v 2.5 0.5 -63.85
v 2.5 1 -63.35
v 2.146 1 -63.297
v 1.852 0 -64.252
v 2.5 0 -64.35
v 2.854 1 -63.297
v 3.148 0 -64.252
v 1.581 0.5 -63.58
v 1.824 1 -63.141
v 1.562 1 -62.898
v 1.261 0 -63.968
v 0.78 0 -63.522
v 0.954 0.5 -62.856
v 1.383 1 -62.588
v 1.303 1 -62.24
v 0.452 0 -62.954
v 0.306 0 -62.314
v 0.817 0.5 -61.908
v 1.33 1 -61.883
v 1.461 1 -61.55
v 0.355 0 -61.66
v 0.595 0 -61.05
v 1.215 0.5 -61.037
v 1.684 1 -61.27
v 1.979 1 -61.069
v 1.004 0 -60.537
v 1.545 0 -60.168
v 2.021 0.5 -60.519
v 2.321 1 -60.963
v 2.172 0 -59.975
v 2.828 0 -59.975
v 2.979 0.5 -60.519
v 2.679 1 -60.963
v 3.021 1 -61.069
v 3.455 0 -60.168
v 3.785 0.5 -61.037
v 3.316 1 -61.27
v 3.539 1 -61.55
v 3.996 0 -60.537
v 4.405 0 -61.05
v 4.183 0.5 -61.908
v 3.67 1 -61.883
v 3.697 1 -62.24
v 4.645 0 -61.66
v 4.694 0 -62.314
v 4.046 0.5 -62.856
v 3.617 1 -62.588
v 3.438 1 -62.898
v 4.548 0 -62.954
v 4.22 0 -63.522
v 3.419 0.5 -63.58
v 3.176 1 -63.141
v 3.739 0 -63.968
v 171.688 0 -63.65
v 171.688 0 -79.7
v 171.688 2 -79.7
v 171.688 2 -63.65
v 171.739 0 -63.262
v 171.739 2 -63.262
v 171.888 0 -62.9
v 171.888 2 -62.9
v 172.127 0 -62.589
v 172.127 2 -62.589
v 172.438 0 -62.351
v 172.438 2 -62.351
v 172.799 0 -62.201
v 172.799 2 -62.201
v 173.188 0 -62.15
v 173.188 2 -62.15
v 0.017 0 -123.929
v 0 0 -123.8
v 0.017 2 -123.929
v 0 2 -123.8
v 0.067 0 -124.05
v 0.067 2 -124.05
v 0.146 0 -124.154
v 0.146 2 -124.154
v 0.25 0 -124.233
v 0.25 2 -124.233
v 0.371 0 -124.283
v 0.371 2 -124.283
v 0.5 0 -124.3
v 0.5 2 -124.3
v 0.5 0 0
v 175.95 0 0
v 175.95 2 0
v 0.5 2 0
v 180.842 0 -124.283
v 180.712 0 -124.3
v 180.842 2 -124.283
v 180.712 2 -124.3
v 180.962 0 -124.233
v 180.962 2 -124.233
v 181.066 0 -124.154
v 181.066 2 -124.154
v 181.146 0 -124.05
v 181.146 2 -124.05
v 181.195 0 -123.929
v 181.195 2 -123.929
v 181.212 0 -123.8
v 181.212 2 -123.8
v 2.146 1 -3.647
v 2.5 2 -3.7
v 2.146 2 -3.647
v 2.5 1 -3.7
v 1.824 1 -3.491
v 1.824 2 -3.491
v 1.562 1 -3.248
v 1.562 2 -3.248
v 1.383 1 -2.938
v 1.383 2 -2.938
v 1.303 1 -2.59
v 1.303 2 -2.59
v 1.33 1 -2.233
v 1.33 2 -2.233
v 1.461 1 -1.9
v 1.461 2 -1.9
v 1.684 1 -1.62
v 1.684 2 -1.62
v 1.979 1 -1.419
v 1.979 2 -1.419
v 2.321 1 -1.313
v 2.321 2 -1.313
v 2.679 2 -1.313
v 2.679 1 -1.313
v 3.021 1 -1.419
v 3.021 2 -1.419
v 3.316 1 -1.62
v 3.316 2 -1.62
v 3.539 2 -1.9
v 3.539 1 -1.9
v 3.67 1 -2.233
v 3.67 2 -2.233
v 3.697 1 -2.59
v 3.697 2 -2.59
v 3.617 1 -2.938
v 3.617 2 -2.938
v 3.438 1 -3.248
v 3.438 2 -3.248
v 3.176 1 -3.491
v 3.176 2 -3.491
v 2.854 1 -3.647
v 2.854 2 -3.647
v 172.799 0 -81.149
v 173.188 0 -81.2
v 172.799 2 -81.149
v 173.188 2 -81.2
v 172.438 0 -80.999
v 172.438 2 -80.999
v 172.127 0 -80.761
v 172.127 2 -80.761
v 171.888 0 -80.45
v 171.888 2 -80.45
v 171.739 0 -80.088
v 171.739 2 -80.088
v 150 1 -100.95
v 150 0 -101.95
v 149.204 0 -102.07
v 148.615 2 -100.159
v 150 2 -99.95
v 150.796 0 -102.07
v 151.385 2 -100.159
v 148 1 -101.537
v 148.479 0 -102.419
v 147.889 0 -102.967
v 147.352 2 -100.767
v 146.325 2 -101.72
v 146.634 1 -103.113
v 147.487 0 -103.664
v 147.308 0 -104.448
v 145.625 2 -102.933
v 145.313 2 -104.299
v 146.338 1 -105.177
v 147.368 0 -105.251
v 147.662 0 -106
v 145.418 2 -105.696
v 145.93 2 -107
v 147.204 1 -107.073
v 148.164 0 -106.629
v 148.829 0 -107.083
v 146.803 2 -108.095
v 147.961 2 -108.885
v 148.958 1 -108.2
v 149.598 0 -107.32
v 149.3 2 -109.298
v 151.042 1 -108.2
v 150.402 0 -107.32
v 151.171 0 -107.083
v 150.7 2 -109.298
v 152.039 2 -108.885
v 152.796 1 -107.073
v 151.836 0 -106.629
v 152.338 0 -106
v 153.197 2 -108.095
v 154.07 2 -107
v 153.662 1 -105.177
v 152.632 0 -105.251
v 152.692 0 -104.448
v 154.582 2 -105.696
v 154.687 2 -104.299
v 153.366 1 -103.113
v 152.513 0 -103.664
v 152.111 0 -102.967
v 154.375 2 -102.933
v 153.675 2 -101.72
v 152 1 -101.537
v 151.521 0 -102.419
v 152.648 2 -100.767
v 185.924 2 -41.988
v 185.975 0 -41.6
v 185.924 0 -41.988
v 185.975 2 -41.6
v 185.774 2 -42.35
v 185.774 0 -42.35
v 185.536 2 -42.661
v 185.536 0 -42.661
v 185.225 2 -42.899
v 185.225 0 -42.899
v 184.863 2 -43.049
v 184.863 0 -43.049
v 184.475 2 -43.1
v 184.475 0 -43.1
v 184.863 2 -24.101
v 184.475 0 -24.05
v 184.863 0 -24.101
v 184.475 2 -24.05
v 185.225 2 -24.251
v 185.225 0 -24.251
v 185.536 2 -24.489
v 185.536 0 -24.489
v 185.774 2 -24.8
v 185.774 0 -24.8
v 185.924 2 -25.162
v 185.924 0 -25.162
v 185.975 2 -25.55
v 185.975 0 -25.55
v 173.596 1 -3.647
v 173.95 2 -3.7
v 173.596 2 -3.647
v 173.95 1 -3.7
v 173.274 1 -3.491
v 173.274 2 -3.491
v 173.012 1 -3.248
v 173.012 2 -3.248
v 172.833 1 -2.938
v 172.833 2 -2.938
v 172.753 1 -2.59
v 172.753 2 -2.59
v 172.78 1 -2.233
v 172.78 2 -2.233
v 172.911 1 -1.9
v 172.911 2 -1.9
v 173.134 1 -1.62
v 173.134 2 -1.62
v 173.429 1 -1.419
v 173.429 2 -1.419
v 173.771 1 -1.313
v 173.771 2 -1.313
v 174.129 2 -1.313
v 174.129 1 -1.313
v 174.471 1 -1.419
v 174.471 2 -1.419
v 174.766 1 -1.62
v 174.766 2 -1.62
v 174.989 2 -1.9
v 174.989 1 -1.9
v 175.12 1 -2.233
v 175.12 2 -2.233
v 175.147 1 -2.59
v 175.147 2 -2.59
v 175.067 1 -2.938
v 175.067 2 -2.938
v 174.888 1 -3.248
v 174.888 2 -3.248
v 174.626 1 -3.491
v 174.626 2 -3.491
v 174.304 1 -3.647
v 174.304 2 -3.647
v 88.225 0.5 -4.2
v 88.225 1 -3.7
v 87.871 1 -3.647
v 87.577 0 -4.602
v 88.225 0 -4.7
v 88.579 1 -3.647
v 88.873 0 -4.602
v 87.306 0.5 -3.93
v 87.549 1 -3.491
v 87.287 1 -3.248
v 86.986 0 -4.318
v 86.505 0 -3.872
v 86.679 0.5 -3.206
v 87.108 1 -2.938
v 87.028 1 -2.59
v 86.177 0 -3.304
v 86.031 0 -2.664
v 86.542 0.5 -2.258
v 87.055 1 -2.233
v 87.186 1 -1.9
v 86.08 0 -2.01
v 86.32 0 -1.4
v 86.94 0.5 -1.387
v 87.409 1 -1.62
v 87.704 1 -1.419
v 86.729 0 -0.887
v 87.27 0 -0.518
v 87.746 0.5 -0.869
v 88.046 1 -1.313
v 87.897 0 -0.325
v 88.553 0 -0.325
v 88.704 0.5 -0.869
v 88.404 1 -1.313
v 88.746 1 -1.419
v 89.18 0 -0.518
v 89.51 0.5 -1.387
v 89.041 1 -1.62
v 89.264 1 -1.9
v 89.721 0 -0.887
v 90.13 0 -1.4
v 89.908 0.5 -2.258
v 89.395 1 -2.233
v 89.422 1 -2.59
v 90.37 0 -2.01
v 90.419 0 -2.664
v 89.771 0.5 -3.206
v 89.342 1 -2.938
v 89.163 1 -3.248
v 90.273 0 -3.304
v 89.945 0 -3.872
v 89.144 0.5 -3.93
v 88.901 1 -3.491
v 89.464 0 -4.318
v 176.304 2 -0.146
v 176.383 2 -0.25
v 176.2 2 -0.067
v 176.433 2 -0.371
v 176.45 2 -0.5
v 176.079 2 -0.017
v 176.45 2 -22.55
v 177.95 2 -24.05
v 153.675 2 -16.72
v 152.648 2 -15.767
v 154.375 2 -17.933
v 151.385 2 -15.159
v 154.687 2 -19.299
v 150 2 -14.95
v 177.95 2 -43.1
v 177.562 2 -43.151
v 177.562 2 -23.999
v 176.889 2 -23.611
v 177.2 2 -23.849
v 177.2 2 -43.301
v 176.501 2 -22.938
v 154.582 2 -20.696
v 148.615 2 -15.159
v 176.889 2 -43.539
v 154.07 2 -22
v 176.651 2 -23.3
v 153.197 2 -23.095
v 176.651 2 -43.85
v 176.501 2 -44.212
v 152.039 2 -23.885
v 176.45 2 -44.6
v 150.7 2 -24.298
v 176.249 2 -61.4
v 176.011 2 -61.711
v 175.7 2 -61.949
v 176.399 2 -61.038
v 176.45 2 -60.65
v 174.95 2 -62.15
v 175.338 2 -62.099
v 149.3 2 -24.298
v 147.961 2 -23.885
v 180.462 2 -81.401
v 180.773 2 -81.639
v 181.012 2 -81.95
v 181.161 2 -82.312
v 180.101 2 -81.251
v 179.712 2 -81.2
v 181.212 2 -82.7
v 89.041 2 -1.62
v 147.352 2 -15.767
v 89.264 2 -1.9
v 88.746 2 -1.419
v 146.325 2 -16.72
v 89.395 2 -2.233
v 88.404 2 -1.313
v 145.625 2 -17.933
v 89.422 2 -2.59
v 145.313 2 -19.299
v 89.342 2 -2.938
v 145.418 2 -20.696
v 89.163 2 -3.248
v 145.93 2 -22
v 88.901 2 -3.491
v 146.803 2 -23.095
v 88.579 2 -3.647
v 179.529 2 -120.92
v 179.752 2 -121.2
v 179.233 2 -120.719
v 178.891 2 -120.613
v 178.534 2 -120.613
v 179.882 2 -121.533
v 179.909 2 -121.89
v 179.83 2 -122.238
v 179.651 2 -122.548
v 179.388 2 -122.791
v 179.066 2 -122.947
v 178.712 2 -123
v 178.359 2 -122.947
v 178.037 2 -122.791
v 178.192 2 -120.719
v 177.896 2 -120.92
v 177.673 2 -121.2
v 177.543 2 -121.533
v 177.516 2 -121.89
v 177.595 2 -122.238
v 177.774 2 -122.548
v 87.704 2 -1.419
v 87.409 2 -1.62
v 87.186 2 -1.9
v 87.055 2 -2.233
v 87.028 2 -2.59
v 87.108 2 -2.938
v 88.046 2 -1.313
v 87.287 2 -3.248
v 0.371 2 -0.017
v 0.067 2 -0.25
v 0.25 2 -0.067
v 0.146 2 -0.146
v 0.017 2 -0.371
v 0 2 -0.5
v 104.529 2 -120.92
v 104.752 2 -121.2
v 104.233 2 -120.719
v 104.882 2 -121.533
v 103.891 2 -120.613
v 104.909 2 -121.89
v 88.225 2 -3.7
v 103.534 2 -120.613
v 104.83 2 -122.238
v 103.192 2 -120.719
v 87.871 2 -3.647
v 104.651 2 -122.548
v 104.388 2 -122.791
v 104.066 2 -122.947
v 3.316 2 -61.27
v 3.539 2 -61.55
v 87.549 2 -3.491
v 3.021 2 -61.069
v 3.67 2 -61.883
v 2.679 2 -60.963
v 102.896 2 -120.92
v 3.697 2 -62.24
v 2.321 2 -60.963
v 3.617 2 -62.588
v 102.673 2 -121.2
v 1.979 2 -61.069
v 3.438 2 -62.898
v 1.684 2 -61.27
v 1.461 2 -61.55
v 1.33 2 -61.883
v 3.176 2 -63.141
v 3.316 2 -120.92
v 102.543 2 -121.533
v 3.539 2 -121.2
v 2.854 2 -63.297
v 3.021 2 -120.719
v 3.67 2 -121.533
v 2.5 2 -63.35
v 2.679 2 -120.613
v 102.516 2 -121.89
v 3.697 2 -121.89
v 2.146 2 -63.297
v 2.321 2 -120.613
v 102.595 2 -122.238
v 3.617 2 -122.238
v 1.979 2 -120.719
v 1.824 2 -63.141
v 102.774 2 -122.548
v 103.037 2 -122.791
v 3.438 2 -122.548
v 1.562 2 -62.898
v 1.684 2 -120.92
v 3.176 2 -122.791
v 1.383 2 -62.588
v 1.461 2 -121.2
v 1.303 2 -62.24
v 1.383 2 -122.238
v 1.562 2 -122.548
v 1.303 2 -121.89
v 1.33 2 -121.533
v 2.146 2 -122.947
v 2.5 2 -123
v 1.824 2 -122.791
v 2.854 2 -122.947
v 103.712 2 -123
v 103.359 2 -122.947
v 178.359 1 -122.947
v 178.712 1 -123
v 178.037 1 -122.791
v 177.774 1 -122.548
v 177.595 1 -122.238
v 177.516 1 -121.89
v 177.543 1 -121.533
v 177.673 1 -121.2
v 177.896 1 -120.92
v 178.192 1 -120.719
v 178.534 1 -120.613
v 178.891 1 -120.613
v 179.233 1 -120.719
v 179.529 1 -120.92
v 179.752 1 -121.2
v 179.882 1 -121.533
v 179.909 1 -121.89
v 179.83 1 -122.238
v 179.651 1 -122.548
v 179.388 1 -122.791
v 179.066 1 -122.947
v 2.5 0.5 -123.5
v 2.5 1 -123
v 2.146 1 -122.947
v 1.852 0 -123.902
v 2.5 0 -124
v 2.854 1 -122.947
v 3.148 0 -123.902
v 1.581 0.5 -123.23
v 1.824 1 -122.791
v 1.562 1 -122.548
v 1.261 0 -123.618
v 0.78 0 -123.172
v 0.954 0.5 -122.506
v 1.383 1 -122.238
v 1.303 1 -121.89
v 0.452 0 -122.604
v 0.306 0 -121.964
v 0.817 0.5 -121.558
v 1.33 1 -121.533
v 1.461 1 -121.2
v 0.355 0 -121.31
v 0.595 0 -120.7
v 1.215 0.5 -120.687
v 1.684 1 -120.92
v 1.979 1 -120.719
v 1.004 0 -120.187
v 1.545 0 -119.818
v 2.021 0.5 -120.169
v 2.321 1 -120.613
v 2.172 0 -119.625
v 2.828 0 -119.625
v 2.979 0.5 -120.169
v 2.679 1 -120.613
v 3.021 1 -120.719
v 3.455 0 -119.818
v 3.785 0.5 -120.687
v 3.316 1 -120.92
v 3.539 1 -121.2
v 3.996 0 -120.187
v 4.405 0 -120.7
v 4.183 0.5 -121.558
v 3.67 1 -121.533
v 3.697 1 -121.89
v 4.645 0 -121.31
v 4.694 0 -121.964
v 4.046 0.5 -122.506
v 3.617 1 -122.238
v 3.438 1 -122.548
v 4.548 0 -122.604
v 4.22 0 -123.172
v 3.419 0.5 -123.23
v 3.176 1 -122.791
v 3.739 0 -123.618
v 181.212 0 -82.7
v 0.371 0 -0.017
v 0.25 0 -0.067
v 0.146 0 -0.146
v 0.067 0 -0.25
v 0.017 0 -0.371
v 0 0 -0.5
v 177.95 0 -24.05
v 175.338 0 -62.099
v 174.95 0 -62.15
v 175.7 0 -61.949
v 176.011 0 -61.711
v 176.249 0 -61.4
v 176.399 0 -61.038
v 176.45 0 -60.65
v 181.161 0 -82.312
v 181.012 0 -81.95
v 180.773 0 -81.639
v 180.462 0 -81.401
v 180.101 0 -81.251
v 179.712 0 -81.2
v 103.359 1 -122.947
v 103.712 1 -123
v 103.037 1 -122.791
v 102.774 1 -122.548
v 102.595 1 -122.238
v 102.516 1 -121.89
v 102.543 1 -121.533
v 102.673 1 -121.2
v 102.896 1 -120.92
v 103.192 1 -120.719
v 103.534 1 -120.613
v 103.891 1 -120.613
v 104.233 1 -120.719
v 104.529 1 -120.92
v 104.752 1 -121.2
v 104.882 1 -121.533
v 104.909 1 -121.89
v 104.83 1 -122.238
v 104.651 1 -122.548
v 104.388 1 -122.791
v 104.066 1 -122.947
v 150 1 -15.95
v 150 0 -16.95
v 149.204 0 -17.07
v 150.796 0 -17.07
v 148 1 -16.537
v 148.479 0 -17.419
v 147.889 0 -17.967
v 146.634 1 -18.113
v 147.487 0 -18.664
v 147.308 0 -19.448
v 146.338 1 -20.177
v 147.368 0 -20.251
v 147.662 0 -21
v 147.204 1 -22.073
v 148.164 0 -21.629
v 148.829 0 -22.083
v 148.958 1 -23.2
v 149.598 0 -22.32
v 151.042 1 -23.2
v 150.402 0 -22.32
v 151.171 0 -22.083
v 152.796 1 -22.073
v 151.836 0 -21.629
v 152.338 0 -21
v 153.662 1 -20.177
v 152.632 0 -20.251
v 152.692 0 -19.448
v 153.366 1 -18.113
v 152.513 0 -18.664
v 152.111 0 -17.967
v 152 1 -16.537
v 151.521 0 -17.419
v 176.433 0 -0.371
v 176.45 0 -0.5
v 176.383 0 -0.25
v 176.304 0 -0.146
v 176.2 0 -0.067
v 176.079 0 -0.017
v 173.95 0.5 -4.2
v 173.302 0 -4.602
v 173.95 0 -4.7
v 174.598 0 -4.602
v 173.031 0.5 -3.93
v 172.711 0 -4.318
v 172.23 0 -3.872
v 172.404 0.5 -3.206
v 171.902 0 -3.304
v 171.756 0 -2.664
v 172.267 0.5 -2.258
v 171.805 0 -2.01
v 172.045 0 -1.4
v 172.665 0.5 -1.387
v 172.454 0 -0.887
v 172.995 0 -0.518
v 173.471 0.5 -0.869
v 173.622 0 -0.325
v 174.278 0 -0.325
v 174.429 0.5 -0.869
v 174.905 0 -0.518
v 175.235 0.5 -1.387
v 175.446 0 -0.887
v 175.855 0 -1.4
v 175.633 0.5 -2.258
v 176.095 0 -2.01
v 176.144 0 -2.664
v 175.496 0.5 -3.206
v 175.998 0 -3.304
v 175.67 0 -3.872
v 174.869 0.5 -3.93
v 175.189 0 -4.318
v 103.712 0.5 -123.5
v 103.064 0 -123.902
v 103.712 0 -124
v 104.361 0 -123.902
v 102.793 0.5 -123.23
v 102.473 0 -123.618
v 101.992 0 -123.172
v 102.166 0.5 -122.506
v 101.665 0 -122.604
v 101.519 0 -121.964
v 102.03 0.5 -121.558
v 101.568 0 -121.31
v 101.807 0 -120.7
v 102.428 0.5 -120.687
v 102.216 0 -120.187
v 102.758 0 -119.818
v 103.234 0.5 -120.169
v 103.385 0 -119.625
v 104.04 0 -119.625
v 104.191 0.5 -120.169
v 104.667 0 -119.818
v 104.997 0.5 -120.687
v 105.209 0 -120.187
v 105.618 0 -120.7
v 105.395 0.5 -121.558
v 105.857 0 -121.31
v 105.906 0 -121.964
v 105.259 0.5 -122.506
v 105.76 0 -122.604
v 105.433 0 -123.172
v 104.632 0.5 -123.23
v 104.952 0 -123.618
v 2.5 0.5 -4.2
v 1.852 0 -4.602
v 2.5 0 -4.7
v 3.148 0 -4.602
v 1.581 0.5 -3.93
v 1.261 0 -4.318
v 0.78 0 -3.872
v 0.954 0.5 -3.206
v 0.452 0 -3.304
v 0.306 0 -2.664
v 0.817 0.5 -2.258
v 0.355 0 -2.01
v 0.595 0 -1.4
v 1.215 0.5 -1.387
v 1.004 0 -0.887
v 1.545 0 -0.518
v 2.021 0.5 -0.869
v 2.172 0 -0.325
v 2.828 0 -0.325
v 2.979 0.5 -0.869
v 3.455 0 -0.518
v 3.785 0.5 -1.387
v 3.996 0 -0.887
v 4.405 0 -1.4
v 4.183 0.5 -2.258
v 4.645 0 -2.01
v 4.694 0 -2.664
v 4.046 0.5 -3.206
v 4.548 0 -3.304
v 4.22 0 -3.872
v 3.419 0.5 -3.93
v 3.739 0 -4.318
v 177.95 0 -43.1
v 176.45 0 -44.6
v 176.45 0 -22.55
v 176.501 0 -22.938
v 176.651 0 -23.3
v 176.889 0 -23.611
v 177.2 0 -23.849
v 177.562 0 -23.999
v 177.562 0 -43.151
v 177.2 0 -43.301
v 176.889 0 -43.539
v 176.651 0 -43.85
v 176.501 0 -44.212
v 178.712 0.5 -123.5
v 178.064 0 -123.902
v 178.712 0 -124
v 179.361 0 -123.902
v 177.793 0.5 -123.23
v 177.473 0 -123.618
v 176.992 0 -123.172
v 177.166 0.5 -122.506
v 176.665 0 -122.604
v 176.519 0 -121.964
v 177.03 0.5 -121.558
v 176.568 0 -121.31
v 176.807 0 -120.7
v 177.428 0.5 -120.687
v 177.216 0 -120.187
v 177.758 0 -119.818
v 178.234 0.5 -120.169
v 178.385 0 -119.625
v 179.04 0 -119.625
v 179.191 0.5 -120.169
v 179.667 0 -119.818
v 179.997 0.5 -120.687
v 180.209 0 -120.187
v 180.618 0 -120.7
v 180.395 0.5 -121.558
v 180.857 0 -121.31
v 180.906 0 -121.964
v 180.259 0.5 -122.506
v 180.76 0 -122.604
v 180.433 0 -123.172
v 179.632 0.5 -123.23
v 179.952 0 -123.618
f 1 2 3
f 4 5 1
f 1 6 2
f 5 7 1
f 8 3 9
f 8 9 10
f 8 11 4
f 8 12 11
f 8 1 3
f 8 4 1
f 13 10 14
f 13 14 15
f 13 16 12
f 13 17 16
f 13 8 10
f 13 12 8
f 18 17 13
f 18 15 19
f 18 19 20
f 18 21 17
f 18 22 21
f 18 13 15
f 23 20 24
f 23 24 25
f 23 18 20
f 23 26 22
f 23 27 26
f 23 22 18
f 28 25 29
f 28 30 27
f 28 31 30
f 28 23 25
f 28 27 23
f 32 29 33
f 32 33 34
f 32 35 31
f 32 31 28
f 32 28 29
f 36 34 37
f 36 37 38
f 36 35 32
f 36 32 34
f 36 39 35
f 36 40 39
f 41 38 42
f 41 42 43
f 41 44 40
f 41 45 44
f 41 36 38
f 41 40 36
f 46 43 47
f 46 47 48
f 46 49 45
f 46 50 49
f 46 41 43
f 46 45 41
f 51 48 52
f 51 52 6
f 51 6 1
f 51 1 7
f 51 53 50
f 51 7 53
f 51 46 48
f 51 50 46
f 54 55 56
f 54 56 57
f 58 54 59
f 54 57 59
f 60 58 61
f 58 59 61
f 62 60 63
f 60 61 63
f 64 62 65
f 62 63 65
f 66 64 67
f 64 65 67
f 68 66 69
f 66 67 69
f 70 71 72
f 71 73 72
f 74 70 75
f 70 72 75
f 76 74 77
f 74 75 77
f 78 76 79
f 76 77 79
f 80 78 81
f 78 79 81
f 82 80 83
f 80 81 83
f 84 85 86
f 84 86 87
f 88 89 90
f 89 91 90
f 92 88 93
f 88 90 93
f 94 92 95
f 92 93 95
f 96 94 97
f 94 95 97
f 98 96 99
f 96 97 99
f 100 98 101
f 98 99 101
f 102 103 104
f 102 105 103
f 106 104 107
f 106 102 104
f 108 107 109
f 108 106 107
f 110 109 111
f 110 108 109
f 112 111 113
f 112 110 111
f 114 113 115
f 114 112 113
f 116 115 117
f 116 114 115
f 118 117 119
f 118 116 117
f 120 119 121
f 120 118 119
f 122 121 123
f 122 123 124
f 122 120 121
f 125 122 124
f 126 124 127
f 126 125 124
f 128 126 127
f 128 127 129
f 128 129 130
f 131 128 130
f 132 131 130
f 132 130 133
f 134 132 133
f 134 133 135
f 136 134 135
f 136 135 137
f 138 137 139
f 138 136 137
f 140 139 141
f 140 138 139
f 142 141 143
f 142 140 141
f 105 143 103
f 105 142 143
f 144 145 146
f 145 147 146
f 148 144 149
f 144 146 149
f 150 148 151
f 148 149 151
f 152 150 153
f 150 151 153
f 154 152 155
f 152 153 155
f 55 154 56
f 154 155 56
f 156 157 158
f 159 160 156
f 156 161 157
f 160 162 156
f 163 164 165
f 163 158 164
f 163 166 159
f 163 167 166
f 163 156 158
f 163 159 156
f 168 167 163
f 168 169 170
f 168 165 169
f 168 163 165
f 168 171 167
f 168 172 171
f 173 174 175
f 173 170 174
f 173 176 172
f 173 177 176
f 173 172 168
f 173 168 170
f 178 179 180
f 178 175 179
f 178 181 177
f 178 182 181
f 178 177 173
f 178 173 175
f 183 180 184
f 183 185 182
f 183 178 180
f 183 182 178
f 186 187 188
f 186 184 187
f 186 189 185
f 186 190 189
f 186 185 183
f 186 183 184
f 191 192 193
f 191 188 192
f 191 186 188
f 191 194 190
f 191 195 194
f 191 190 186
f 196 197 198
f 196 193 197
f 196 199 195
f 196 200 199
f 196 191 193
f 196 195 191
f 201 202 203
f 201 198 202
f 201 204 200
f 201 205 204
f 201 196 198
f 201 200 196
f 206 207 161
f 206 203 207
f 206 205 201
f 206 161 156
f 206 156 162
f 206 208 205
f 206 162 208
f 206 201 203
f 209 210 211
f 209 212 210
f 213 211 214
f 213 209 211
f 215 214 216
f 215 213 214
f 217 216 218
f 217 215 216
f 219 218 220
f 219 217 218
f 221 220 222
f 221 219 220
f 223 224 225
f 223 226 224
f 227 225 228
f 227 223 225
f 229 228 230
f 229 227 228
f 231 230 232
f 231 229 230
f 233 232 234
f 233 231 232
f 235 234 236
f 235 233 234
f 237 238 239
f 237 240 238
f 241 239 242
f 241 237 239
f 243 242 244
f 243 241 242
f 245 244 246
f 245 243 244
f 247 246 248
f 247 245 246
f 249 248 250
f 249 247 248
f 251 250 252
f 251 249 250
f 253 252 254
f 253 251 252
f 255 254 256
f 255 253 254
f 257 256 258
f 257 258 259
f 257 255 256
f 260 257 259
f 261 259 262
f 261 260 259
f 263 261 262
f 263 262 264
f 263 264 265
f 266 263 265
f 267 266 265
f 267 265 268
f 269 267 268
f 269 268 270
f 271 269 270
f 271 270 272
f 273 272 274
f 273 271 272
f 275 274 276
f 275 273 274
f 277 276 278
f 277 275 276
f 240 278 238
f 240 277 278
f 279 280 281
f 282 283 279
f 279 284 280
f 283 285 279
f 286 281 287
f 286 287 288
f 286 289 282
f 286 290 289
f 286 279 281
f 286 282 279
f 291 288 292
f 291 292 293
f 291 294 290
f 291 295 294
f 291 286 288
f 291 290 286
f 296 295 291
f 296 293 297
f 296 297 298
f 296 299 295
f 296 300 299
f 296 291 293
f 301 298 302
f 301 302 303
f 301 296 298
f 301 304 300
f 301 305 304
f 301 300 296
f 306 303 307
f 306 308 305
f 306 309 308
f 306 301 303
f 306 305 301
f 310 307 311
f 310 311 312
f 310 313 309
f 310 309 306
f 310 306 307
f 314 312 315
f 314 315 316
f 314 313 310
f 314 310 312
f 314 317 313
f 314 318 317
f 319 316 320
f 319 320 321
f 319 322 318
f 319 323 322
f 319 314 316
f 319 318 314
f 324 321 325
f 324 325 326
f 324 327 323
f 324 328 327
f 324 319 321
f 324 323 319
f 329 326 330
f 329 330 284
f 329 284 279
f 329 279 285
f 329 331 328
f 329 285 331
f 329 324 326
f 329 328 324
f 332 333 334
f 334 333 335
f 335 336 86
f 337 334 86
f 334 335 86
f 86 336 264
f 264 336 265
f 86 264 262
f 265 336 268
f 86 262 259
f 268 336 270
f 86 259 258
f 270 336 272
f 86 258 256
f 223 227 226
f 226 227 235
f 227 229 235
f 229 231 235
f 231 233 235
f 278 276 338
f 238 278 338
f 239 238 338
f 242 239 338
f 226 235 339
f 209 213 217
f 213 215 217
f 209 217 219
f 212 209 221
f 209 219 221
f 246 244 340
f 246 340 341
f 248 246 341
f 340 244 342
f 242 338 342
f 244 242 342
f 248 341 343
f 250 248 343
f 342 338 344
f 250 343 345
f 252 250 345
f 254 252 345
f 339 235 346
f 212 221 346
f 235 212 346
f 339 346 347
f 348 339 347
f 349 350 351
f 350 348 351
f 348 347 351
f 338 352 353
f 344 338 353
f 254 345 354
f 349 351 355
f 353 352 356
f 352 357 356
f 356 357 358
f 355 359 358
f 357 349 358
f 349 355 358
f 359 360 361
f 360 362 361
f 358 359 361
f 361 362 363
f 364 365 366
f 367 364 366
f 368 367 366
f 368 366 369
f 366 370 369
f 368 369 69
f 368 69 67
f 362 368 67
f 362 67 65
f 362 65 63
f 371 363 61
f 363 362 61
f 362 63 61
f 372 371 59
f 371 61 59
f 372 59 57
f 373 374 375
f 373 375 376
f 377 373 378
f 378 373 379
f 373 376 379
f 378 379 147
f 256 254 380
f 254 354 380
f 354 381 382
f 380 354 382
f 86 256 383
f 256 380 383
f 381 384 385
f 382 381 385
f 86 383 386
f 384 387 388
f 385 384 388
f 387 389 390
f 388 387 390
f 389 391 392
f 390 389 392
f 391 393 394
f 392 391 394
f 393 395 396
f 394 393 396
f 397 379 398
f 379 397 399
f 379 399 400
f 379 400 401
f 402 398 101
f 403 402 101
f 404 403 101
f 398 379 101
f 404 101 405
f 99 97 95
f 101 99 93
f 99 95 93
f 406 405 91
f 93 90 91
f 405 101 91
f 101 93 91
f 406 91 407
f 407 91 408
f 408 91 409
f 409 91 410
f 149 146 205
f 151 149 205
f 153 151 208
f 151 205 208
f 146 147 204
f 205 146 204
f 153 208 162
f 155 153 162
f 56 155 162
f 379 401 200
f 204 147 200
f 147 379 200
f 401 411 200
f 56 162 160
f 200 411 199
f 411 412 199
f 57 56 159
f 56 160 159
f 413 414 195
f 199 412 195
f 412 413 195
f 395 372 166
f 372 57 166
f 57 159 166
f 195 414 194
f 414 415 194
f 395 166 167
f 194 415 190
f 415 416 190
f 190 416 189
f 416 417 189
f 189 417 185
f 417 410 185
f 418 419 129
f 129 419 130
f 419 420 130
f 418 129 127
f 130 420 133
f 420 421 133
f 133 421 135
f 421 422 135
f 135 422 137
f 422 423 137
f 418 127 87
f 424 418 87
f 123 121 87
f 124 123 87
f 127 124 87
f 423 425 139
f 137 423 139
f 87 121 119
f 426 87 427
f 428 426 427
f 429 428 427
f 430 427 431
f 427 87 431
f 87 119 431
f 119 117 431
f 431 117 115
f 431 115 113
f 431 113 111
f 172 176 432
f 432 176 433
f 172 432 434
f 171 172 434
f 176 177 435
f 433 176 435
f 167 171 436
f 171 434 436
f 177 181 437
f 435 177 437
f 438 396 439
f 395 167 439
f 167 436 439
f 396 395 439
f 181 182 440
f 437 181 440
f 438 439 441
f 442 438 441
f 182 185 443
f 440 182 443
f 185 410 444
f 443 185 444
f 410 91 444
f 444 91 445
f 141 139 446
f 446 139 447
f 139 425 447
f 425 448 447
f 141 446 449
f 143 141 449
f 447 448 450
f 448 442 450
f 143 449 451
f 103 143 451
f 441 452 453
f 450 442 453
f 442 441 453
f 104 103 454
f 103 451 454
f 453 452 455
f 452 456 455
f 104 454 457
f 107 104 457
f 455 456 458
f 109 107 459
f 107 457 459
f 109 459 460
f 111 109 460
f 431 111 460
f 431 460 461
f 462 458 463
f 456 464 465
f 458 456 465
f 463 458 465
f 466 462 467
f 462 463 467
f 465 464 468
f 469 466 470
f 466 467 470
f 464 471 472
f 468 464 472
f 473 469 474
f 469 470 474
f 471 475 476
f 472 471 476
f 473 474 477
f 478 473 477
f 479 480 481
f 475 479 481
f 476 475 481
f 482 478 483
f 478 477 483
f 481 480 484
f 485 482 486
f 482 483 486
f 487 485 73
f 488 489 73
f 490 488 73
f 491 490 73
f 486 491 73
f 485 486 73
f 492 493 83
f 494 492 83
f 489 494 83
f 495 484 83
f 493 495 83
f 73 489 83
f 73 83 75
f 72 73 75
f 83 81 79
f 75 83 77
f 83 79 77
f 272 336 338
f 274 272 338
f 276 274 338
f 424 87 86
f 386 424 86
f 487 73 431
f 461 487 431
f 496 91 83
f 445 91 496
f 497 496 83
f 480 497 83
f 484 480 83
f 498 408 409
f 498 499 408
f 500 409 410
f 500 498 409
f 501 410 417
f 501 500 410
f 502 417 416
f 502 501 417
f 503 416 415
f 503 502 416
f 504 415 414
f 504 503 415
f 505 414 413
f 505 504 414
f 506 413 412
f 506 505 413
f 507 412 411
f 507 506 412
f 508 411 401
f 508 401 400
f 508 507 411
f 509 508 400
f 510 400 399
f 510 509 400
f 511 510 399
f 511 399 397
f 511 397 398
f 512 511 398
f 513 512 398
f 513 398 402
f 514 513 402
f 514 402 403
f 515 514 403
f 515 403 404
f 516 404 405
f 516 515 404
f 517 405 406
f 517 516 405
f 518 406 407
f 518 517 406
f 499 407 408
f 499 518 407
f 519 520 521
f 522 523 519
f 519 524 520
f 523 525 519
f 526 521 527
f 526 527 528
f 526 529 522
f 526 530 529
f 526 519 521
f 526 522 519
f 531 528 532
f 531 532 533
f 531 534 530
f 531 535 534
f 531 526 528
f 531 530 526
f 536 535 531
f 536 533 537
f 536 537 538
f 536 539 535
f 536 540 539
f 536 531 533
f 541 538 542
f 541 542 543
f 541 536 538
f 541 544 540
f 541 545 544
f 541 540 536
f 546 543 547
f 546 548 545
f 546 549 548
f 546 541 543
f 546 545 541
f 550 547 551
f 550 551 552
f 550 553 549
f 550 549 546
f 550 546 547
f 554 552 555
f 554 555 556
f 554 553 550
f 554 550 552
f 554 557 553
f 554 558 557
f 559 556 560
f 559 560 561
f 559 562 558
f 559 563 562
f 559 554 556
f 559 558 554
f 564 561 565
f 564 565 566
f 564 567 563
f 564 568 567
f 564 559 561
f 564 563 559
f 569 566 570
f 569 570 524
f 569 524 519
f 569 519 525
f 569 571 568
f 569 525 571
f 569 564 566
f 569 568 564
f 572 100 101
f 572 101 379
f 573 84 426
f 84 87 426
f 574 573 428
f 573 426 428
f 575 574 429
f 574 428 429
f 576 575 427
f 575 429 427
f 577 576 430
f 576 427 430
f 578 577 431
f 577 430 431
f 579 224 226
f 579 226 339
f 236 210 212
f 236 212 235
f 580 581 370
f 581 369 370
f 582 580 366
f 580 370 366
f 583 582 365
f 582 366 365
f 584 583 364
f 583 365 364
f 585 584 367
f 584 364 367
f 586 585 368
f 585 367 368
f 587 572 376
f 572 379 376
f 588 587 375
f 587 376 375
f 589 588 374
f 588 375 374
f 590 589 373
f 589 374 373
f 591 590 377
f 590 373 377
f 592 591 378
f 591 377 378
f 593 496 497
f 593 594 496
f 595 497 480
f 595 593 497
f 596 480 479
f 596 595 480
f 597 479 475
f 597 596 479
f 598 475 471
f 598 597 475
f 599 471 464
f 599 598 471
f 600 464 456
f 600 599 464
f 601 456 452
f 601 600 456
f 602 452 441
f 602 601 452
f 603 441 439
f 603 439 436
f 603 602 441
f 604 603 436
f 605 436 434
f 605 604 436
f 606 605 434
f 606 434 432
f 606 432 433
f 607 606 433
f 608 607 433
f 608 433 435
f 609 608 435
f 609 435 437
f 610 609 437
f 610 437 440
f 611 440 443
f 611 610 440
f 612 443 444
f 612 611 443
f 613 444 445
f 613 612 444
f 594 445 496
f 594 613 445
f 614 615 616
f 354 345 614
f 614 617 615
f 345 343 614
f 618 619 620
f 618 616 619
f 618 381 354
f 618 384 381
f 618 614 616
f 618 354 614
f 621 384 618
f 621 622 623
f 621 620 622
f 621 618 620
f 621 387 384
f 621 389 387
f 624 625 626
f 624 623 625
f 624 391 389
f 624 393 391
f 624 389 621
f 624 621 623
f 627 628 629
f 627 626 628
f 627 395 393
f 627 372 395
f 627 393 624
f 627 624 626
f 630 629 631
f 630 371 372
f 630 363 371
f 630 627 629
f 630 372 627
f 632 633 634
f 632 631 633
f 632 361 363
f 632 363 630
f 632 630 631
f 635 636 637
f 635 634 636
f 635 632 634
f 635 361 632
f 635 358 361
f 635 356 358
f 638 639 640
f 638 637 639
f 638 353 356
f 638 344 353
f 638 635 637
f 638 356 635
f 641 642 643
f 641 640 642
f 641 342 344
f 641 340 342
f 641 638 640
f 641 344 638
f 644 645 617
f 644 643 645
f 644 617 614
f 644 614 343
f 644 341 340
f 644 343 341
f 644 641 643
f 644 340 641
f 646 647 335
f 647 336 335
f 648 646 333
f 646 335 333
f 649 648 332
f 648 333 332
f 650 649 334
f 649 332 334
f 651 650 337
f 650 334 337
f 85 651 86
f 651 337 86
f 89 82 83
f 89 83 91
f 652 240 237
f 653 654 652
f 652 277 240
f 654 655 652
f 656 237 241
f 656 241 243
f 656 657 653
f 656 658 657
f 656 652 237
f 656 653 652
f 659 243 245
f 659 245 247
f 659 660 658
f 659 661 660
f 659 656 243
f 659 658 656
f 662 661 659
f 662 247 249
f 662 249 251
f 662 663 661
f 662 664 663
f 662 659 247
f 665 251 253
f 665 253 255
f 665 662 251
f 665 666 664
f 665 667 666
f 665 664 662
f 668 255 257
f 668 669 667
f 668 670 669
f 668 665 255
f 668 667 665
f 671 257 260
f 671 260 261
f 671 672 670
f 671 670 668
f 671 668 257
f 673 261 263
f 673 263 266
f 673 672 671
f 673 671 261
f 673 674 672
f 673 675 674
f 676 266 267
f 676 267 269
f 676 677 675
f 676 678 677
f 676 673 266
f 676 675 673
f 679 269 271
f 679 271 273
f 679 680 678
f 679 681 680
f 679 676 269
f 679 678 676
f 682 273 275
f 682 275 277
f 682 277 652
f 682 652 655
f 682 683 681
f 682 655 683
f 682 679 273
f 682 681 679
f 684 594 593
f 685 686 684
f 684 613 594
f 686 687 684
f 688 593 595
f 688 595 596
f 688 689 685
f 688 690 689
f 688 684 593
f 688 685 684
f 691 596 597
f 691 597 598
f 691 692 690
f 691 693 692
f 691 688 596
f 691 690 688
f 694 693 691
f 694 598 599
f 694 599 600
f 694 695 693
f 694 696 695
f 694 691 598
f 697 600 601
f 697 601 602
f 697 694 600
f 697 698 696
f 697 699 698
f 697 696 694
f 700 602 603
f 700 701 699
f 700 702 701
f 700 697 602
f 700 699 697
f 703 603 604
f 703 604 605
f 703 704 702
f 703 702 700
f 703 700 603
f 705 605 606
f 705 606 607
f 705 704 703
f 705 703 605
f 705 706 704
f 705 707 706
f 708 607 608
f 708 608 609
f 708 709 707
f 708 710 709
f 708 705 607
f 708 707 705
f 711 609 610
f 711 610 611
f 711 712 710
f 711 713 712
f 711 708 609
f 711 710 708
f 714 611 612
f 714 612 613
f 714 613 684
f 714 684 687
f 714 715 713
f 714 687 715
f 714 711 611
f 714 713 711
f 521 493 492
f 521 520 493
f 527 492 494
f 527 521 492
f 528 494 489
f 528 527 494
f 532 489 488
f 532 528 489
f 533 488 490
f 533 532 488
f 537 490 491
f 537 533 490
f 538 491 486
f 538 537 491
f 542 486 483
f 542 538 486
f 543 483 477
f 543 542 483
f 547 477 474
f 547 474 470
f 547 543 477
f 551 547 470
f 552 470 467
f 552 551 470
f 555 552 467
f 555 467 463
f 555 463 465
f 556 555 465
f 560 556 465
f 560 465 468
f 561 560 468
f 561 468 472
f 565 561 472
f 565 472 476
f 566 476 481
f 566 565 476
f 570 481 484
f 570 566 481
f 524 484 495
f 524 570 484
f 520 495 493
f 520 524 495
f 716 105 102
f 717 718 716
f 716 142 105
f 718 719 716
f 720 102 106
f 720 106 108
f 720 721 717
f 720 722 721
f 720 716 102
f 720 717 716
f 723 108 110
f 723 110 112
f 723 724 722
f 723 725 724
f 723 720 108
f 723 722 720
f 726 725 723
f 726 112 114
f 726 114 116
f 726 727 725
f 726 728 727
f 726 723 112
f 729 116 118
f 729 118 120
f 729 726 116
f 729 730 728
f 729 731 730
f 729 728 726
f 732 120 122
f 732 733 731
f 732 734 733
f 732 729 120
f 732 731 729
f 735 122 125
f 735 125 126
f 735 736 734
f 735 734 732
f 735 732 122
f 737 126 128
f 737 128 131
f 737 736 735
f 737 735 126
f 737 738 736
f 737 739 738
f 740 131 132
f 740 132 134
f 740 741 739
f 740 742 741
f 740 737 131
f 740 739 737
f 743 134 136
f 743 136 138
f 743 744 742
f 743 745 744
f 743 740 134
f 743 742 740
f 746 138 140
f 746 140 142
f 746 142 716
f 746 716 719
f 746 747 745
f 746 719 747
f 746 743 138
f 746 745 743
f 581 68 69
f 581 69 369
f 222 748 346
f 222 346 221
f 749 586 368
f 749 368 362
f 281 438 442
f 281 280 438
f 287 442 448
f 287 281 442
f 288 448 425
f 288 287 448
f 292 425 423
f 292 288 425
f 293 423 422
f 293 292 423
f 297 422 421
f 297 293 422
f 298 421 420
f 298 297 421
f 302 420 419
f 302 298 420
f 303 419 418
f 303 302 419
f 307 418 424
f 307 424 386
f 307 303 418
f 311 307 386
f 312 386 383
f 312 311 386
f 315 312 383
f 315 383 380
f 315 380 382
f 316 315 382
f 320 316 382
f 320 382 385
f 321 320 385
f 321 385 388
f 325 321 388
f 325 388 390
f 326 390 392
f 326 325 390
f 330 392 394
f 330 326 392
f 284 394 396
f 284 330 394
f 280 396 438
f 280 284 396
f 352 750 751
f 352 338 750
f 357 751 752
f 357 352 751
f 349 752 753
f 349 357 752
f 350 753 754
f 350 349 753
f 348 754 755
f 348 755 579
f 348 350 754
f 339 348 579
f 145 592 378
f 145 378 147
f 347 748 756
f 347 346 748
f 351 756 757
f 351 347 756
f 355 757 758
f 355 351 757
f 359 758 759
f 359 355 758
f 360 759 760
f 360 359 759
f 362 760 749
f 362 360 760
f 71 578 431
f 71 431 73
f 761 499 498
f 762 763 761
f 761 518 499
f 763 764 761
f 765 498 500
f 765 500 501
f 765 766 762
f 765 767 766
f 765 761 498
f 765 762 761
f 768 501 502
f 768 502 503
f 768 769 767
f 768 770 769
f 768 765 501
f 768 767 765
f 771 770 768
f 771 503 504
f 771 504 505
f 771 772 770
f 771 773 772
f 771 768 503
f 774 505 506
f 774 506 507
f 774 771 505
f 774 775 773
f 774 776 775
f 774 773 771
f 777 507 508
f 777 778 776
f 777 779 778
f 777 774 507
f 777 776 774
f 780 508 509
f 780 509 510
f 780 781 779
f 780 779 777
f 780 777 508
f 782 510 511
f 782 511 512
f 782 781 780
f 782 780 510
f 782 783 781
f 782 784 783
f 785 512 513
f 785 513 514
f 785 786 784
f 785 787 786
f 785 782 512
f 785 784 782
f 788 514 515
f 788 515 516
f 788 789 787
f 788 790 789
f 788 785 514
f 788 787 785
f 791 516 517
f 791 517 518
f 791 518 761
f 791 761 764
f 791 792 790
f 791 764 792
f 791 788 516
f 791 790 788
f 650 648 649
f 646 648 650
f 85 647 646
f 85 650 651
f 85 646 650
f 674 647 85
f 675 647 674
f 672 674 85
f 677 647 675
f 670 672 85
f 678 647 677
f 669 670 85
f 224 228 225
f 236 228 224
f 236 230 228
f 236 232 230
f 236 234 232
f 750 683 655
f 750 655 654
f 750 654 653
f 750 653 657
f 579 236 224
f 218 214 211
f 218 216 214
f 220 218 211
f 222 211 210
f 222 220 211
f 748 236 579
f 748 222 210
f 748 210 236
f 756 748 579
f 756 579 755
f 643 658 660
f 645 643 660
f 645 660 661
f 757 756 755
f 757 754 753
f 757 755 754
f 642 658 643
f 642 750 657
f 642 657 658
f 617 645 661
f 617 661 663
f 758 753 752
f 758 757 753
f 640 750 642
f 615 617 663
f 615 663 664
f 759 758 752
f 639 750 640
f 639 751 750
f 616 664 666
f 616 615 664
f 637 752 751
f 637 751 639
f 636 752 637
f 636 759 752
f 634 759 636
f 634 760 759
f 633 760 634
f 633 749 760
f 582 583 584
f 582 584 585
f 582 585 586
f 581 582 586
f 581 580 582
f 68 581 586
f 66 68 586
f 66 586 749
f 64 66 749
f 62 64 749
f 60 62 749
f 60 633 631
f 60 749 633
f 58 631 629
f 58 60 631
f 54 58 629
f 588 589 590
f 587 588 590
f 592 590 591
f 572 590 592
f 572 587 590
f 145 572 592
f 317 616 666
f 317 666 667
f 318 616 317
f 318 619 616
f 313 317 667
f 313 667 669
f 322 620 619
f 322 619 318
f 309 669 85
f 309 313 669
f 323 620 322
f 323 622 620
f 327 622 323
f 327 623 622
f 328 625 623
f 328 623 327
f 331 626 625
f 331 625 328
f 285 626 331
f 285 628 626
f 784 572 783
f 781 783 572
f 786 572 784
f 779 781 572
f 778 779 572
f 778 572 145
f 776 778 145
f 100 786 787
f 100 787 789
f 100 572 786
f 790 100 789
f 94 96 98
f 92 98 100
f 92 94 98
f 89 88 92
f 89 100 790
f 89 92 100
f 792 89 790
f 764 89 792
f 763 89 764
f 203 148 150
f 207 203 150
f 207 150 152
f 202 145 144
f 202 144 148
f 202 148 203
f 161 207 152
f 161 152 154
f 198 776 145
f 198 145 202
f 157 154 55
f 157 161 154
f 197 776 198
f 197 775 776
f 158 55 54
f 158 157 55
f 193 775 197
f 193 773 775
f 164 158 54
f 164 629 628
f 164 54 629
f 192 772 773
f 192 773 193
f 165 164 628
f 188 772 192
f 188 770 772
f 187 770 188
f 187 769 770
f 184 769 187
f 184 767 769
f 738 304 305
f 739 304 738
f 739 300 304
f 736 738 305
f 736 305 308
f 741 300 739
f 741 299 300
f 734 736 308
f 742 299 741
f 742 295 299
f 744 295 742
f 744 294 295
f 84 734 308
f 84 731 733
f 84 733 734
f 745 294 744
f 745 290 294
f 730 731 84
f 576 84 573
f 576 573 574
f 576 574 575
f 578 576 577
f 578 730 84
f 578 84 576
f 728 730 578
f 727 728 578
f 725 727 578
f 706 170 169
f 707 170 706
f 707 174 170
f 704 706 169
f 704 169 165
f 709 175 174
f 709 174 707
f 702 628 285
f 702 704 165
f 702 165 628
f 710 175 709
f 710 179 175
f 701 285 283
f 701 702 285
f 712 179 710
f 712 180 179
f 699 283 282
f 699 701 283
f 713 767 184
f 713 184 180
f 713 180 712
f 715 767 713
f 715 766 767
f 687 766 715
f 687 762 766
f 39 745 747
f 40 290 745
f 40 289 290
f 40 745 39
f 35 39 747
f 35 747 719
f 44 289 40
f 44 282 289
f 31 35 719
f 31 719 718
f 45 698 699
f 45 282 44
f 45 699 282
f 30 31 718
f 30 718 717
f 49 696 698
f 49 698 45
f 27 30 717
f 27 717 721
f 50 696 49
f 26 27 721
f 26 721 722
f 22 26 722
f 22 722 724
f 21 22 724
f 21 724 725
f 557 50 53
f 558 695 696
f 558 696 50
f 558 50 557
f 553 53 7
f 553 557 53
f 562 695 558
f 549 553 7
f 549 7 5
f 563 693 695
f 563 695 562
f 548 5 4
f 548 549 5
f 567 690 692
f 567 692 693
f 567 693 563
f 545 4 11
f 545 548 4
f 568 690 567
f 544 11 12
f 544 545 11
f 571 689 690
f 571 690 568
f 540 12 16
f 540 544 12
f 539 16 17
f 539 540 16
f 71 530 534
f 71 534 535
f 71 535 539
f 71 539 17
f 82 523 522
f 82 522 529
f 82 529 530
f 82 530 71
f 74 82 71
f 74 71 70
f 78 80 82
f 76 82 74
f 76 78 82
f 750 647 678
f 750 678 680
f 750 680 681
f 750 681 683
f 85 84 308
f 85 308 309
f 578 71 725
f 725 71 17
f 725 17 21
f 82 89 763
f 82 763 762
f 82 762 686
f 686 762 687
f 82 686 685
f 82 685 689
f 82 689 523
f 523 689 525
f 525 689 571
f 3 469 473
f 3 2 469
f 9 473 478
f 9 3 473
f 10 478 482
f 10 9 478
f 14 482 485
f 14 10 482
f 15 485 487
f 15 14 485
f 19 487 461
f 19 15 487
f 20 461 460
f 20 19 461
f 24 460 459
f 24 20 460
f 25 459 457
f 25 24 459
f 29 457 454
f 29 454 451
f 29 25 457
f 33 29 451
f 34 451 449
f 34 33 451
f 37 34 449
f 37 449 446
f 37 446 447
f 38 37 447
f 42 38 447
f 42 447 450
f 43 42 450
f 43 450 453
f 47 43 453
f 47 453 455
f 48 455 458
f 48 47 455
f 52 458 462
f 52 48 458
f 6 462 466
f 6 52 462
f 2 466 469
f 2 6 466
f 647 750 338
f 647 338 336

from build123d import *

# Parameters (mm, degrees)
PLATE_FRAME_DEPTH                              = 2
CSK_FOR_M2_FLAT_HEAD_MACHINE_SCREW2_AT_2_COUNT = 2
CSK_FOR_M2_FLAT_HEAD_MACHINE_SCREW2_AT_2_PITCH = 75
CSK_FOR_M2_FLAT_HEAD_MACHINE_SCREW2_AT_3_COUNT = 2
CSK_FOR_M2_FLAT_HEAD_MACHINE_SCREW2_AT_3_PITCH = 176.2125
CSK_FOR_M2_FLAT_HEAD_MACHINE_SCREW2_AT_4_COUNT = 2
CSK_FOR_M2_FLAT_HEAD_MACHINE_SCREW2_AT_4_PITCH = 186.034856025
CSK_FOR_M2_FLAT_HEAD_MACHINE_SCREW2_AT_5_COUNT = 2
CSK_FOR_M2_FLAT_HEAD_MACHINE_SCREW2_AT_5_PITCH = 212.798813804
CSK_FOR_M2_FLAT_HEAD_MACHINE_SCREW2_AT_6_COUNT = 2
CSK_FOR_M2_FLAT_HEAD_MACHINE_SCREW2_AT_6_PITCH = 149.734690891
CSK_FOR_M2_FLAT_HEAD_MACHINE_SCREW2_AT_7_COUNT = 2
CSK_FOR_M2_FLAT_HEAD_MACHINE_SCREW2_AT_7_PITCH = 119.395022535
CSK_FOR_M4_FLAT_HEAD_MACHINE_SCREW1_AT_2_COUNT = 2
CSK_FOR_M4_FLAT_HEAD_MACHINE_SCREW1_AT_2_PITCH = 85
FILLET3_R                                      = 1.5
FILLET4_R                                      = 0.5


with BuildPart() as part:
    # Sketch1 → Plate Frame (new body)
    with BuildSketch(Plane(origin=(0, 0, 0), x_dir=(1, 0, 0), z_dir=(0, 1, 0))):
        Polygon((0, 0), (0, 124.3), (181.2125, 124.3), (181.2125, 81.2), (171.6875, 81.2), (171.6875, 62.15), (176.45, 62.15), (176.45, 43.1), (185.975, 43.1), (185.975, 24.05), (176.45, 24.05), (176.45, 0), align=None)
    extrude(amount=PLATE_FRAME_DEPTH)

    # Sketch23 → CSK for M2 Flat Head Machine Screw2 (revolve, cut)
    with BuildSketch(Plane(origin=(178.7125, 0, -121.8), x_dir=(0, 0, -1), z_dir=(1, 0, 0))):
        Polygon((0, 0), (0, 2), (1.2, 2), (1.2, 1), (2.2, 0), align=None)
    csk_for_m2_flat_head_machine_screw2 = revolve(axis=Axis((178.7125, -6.35, -121.8), (0, 1, 0)), mode=Mode.SUBTRACT)

    # CSK for M2 Flat Head Machine Screw2 at 2: CSK for M2 Flat Head Machine Screw2 ×2
    with Locations(*[(-i * CSK_FOR_M2_FLAT_HEAD_MACHINE_SCREW2_AT_2_PITCH, 0, 0) for i in range(1, CSK_FOR_M2_FLAT_HEAD_MACHINE_SCREW2_AT_2_COUNT)]):
        add(csk_for_m2_flat_head_machine_screw2, mode=Mode.SUBTRACT)

    # CSK for M2 Flat Head Machine Screw2 at 3: CSK for M2 Flat Head Machine Screw2 ×2
    with Locations(*[(-i * CSK_FOR_M2_FLAT_HEAD_MACHINE_SCREW2_AT_3_PITCH, 0, 0) for i in range(1, CSK_FOR_M2_FLAT_HEAD_MACHINE_SCREW2_AT_3_COUNT)]):
        add(csk_for_m2_flat_head_machine_screw2, mode=Mode.SUBTRACT)

    # CSK for M2 Flat Head Machine Screw2 at 4: CSK for M2 Flat Head Machine Screw2 ×2
    with Locations(*[Vector(-0.9472015286011822, 0, 0.3206388376594201) * (i * CSK_FOR_M2_FLAT_HEAD_MACHINE_SCREW2_AT_4_PITCH) for i in range(1, CSK_FOR_M2_FLAT_HEAD_MACHINE_SCREW2_AT_4_COUNT)]):
        add(csk_for_m2_flat_head_machine_screw2, mode=Mode.SUBTRACT)

    # CSK for M2 Flat Head Machine Screw2 at 5: CSK for M2 Flat Head Machine Screw2 ×2
    with Locations(*[Vector(-0.828070875256726, 0, 0.5606234257962827) * (i * CSK_FOR_M2_FLAT_HEAD_MACHINE_SCREW2_AT_5_PITCH) for i in range(1, CSK_FOR_M2_FLAT_HEAD_MACHINE_SCREW2_AT_5_COUNT)]):
        add(csk_for_m2_flat_head_machine_screw2, mode=Mode.SUBTRACT)

    # CSK for M2 Flat Head Machine Screw2 at 6: CSK for M2 Flat Head Machine Screw2 ×2
    with Locations(*[Vector(-0.6043188753487793, 0, 0.7967425537130464) * (i * CSK_FOR_M2_FLAT_HEAD_MACHINE_SCREW2_AT_6_PITCH) for i in range(1, CSK_FOR_M2_FLAT_HEAD_MACHINE_SCREW2_AT_6_COUNT)]):
        add(csk_for_m2_flat_head_machine_screw2, mode=Mode.SUBTRACT)

    # CSK for M2 Flat Head Machine Screw2 at 7: CSK for M2 Flat Head Machine Screw2 ×2
    with Locations(*[Vector(-0.039888597521597645, 0, 0.9992041331918919) * (i * CSK_FOR_M2_FLAT_HEAD_MACHINE_SCREW2_AT_7_PITCH) for i in range(1, CSK_FOR_M2_FLAT_HEAD_MACHINE_SCREW2_AT_7_COUNT)]):
        add(csk_for_m2_flat_head_machine_screw2, mode=Mode.SUBTRACT)

    # Sketch26 → CSK for M4 Flat Head Machine Screw1 (revolve, cut)
    with BuildSketch(Plane(origin=(150, 2, -104.65), x_dir=(0, 0, 1), z_dir=(1, 0, 0))):
        Polygon((0, 0), (0, 2), (2.25, 2), (2.25, 2.45), (4.7, 0), align=None)
    csk_for_m4_flat_head_machine_screw1 = revolve(axis=Axis((150, 8.35, -104.65), (0, -1, 0)), mode=Mode.SUBTRACT)

    # CSK for M4 Flat Head Machine Screw1 at 2: CSK for M4 Flat Head Machine Screw1 ×2
    with Locations(*[(0, 0, i * CSK_FOR_M4_FLAT_HEAD_MACHINE_SCREW1_AT_2_PITCH) for i in range(1, CSK_FOR_M4_FLAT_HEAD_MACHINE_SCREW1_AT_2_COUNT)]):
        add(csk_for_m4_flat_head_machine_screw1, mode=Mode.SUBTRACT)

    # Fillet3
    fillet3_edges = [part.edges().sort_by_distance(p)[0] for p in [
        (181.2125, 1, -81.2),
        (171.6875, 1, -81.2),
        (171.6875, 1, -62.15),
        (176.45, 1, -62.15),
        (176.45, 1, -43.1),
        (185.975, 1, -43.1),
        (185.975, 1, -24.05),
        (176.45, 1, -24.05),
    ]]
    fillet(fillet3_edges, radius=FILLET3_R)

    # Fillet4
    fillet4_edges = [part.edges().sort_by_distance(p)[0] for p in [
        (0, 1, 0),
        (0, 1, -124.3),
        (181.2125, 1, -124.3),
        (176.45, 1, 0),
    ]]
    fillet(fillet4_edges, radius=FILLET4_R)


solid = part.part
